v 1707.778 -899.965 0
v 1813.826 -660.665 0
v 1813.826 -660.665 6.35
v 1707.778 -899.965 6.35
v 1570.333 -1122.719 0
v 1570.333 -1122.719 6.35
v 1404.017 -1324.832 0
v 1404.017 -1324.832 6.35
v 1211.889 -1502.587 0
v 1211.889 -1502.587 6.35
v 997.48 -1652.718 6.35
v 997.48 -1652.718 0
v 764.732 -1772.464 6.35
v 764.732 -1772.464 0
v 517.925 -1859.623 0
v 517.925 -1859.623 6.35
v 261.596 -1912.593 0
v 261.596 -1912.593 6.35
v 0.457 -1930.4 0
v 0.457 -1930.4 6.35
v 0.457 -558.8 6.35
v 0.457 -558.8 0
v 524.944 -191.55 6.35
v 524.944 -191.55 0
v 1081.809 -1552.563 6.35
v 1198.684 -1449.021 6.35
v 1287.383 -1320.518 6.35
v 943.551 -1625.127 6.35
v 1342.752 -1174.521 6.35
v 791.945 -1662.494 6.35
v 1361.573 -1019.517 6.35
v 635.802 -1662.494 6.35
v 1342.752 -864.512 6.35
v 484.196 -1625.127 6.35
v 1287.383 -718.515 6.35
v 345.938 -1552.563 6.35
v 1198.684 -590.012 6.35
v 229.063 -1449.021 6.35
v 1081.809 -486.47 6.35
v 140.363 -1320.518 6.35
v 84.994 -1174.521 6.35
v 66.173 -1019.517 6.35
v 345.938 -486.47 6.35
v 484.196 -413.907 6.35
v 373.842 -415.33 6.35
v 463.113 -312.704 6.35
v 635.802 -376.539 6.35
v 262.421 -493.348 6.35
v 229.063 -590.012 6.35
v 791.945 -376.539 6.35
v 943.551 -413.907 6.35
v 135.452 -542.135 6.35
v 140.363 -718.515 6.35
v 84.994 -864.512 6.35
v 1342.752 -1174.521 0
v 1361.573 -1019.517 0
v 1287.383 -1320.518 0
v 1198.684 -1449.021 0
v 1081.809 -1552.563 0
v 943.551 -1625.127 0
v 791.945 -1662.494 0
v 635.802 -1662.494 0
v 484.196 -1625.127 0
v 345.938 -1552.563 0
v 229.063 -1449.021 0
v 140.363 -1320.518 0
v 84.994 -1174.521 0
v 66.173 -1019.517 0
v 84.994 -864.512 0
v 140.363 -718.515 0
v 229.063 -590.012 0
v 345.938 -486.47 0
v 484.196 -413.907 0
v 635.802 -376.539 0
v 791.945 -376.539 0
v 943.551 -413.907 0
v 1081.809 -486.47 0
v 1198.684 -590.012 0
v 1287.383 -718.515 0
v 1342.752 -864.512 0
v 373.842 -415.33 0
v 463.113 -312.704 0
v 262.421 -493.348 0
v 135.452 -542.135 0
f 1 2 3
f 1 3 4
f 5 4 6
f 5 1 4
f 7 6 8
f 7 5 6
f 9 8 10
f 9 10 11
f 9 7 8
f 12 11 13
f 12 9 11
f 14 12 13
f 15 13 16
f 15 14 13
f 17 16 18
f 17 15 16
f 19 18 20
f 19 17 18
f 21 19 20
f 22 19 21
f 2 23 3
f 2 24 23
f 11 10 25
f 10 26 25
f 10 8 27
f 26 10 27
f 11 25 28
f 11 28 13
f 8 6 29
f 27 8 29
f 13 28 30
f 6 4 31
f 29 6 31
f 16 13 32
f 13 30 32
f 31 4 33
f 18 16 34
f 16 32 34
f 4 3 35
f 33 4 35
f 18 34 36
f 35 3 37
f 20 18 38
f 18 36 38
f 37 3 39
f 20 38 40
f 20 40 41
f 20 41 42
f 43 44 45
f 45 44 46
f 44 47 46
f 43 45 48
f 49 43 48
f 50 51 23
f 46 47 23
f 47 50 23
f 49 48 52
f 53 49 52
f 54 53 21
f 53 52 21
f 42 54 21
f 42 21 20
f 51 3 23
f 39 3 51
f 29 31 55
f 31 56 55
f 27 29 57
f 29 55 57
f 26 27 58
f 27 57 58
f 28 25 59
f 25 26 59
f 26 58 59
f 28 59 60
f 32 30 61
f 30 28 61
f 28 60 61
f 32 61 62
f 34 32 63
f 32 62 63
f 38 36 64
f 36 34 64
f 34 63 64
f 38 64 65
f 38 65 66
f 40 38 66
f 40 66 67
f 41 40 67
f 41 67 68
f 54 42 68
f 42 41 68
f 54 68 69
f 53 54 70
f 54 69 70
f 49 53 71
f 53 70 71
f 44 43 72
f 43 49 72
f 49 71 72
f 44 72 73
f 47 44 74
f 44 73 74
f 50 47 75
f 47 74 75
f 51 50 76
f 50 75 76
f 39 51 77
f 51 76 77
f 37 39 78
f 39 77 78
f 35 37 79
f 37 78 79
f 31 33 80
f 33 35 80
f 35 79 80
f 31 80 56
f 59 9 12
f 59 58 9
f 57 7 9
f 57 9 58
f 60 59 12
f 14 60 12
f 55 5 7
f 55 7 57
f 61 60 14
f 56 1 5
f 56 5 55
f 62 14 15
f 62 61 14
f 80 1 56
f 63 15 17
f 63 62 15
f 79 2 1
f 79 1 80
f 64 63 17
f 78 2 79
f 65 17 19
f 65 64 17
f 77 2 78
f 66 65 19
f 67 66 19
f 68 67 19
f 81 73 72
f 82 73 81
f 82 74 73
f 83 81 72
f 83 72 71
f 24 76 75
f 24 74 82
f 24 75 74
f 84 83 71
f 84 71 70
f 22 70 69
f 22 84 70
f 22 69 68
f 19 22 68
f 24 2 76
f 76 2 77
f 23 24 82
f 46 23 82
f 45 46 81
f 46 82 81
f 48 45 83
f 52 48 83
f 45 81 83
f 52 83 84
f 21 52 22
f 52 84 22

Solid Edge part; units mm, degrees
sketch "Sketch1" plane through (0, 0, 0) normal (0, 0, 1) x (1, 0, 0)
  line L0 (524.9437, -191.5504) -> (1813.8262, -660.6653)
  line L1 (0.4572, -1930.4) -> (0.4572, -558.7998)
  arc A0 (1813.8262, -660.6653) -> (0.4572, -1930.4) centre (-0.0001, 0) cw
  arc A1 (524.9437, -191.5504) -> (0.4572, -558.7998) centre (0, 0) cw
  circle A2 centre (713.8732, -1019.5166) radius 647.7
extrude "Protrusion1" add sketch "Sketch1" along normal blind 6.35
